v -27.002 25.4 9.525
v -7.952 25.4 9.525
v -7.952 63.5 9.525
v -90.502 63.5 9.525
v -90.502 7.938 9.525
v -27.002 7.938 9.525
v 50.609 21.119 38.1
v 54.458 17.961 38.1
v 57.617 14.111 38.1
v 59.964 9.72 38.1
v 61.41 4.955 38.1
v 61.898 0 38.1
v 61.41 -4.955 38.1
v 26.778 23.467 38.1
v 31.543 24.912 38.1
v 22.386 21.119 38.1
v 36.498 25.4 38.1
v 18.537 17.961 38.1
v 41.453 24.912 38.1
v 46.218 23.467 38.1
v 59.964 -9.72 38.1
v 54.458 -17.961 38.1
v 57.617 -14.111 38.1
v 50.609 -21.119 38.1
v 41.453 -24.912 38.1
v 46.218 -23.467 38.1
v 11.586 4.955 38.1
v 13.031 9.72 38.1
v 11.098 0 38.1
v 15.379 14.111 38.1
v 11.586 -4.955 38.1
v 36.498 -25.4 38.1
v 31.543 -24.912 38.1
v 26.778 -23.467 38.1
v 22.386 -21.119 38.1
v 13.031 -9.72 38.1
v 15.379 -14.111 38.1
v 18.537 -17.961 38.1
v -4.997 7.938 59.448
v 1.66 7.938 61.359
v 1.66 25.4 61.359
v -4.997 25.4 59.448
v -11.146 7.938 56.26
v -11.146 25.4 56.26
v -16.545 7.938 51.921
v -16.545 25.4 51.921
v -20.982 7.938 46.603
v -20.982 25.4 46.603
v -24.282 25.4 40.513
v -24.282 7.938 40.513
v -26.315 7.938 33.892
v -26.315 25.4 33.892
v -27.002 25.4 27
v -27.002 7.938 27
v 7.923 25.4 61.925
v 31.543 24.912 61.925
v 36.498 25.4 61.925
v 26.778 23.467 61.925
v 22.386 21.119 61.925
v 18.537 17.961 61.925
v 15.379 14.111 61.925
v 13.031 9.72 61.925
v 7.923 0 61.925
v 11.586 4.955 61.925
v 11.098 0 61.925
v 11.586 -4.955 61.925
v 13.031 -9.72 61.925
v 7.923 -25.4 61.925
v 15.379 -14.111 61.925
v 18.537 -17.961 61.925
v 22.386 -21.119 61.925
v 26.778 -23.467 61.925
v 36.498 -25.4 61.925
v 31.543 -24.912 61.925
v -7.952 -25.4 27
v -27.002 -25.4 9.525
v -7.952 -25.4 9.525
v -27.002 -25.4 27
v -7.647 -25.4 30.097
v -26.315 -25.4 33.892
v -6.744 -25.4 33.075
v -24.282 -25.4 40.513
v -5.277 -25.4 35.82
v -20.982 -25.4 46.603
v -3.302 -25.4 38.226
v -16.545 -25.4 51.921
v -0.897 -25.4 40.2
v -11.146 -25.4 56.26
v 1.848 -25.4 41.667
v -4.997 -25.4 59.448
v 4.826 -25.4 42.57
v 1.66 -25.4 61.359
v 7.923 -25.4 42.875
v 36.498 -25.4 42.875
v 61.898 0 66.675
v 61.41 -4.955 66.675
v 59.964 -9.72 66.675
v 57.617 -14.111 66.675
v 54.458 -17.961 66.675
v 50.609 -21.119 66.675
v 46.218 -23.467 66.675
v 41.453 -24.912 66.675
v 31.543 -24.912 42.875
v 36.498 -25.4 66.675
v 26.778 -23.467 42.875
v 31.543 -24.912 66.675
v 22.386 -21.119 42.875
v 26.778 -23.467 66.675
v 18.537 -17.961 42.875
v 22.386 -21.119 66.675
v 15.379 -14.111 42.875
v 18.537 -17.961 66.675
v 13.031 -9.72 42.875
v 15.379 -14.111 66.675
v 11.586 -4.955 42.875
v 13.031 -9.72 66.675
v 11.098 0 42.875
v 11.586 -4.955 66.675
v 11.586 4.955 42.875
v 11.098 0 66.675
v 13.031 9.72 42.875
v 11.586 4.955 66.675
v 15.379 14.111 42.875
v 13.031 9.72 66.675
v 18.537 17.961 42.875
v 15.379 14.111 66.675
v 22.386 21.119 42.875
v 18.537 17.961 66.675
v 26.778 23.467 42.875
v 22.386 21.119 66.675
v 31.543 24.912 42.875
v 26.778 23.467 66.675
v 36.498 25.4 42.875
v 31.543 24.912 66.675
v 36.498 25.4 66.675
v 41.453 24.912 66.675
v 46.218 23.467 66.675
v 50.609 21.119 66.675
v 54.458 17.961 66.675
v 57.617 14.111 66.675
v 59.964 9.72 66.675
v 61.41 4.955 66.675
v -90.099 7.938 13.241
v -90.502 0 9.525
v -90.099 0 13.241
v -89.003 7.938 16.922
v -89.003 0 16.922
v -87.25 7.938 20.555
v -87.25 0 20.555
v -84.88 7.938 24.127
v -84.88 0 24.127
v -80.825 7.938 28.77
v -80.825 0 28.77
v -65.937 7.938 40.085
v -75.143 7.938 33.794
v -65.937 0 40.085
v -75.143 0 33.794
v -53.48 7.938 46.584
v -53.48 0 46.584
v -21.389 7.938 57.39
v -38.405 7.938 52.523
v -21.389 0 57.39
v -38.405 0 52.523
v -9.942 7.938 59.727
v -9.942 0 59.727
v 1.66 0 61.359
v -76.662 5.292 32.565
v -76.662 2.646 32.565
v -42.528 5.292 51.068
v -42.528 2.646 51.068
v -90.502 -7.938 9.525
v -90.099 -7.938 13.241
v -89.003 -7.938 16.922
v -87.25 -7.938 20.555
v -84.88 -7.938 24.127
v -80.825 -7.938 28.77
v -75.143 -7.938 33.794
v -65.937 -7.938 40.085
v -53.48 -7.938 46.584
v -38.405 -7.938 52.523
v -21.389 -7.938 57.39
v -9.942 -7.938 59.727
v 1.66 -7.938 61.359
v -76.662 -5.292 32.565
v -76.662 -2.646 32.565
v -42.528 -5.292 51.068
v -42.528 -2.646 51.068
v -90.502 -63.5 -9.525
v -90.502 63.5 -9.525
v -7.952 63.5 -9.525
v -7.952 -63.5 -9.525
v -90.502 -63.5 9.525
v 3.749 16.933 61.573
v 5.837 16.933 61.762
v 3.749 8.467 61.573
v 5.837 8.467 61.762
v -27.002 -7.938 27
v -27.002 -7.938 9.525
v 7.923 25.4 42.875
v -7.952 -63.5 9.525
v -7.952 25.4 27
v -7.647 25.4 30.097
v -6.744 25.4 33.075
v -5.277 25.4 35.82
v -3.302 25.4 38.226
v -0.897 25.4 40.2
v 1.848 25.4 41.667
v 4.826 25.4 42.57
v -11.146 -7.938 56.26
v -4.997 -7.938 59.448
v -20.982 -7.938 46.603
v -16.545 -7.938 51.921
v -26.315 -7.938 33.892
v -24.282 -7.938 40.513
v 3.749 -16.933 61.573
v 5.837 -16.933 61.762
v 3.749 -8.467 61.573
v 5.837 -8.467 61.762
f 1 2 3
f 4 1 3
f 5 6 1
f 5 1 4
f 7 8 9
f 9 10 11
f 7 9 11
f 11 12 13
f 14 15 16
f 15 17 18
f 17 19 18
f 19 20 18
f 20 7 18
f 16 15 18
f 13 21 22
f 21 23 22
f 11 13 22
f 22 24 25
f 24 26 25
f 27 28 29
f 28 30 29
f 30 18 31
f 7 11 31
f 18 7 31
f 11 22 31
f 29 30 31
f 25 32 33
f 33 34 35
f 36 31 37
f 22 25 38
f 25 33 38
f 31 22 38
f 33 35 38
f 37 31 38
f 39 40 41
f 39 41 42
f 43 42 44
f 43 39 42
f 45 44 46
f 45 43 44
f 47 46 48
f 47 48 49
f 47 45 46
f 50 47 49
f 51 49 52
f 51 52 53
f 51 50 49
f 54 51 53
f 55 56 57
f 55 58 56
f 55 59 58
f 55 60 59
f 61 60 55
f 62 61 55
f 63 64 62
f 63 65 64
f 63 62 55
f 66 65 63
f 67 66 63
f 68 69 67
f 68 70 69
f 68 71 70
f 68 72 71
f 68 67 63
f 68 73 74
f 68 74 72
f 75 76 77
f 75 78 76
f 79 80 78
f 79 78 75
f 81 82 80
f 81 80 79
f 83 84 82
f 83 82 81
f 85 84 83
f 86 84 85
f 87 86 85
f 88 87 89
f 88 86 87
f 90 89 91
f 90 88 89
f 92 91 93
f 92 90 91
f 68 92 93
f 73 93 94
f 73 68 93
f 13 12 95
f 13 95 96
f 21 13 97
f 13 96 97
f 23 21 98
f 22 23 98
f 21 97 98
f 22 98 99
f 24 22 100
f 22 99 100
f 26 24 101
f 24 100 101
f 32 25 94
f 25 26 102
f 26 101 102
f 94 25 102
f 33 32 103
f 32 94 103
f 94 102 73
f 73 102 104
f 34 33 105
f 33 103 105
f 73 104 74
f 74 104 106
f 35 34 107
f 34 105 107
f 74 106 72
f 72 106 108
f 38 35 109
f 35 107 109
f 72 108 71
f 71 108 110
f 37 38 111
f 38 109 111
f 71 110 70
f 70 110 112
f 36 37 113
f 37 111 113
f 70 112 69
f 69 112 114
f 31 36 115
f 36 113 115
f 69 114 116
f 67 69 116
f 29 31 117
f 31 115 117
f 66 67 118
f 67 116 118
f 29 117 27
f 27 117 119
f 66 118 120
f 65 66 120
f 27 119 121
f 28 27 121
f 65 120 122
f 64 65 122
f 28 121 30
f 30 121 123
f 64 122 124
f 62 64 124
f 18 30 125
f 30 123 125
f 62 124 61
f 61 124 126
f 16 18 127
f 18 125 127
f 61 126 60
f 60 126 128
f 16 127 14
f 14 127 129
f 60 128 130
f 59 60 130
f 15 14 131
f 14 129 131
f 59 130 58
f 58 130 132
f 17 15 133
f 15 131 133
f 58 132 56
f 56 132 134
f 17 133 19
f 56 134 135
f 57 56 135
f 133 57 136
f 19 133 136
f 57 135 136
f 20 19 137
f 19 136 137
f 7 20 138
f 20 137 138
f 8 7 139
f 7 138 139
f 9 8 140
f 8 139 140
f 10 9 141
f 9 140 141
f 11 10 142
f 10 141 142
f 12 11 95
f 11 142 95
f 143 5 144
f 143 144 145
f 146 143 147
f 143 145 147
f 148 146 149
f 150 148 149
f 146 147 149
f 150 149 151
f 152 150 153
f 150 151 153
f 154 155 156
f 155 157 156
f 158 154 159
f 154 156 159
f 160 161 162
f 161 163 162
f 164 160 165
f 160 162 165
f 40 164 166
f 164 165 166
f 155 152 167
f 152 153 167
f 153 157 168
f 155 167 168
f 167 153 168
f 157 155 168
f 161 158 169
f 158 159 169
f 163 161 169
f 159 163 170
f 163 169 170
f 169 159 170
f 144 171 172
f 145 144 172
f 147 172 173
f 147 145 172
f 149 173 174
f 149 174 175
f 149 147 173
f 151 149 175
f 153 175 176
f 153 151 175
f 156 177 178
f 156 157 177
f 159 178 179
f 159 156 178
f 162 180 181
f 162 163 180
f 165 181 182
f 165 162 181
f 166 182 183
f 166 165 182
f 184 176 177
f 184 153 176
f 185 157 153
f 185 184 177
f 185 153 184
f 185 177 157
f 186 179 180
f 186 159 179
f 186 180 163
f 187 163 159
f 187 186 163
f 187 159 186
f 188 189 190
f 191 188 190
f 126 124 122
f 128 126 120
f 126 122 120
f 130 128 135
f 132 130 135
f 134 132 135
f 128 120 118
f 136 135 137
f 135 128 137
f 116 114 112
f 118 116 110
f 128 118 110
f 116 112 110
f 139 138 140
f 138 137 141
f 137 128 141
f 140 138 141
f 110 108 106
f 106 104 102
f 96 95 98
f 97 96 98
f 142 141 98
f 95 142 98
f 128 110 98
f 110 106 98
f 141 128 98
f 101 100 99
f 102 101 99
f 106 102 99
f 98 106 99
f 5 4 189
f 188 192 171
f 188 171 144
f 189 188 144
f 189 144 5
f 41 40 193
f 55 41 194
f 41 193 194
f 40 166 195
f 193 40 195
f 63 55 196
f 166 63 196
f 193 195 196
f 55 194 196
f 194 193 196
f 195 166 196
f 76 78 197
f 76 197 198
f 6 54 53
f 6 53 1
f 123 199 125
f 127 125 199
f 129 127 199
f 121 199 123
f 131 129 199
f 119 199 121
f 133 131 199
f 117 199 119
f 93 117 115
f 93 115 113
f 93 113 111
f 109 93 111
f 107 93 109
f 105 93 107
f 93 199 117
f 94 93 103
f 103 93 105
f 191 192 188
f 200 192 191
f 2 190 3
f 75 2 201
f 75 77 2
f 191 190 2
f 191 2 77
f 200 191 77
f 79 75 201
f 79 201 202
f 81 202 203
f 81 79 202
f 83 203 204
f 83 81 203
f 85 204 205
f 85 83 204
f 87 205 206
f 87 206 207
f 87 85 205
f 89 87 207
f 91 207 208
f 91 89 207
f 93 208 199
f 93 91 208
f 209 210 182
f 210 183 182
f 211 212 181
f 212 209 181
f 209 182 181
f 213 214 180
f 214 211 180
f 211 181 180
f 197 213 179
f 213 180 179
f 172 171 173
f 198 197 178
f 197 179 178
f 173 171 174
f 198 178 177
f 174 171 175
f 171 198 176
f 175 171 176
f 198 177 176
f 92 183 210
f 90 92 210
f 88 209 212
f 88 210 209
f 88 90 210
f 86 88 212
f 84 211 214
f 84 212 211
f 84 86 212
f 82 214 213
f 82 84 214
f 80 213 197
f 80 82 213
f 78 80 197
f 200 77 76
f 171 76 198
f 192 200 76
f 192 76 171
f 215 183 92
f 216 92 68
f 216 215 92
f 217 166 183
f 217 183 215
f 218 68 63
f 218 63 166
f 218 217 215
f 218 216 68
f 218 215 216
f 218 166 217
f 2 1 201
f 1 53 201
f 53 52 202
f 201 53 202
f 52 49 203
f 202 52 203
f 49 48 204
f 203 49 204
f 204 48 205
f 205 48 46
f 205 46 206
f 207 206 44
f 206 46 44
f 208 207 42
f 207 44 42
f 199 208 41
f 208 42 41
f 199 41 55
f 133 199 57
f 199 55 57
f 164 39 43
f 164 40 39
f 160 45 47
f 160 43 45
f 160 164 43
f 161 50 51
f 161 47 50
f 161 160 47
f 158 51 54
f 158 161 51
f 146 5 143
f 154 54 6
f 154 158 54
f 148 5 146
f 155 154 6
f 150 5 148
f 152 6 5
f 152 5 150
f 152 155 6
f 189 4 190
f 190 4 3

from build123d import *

# Parameters (mm, degrees)
F1_DEPTH = 63.5
F0_W     = 25.4
F0_H     = 19.05
F2_DEPTH = 25.4
F3_DEPTH = 7.9375


with BuildPart() as f1:
    # F0 (on Front) → F1 (new body, symmetric)
    with BuildSketch(Plane.XZ):
        Polygon((-90.502063, -9.525), (-7.952063, -9.525), (-7.952063, 9.525), (-27.002063, 9.525), (-90.502063, 9.525), align=None)
    extrude(amount=F1_DEPTH, both=True)

    # F0 (on Front) → F2 (join, symmetric)
    with BuildSketch(Plane.XZ):
        with BuildLine():
            Line((-27.002063, 9.525), (-7.952063, 9.525))
            Line((-7.952063, 9.525), (-7.952063, 27.0002))
            ThreePointArc((-7.952063, 27.0002), (-3.302383, 38.22552), (7.922937, 42.8752))
            Line((7.922937, 42.8752), (11.097937, 42.8752))
            Line((11.097937, 42.8752), (11.097937, 61.9252))
            Line((11.097937, 61.9252), (7.922937, 61.9252))
            add(Edge.make_bspline(
                [(1.660156, 61.359088), (3.749781, 61.58542), (5.838833, 61.774647), (7.922937, 61.9252)],
                knots=[106.639459, 106.639459, 106.639459, 106.639459, 111.504536, 111.504536, 111.504536, 111.504536], degree=3))
            ThreePointArc((1.660156, 61.359088), (-18.895743, 49.37237), (-27.002063, 27.0002))
            Line((-27.002063, 27.0002), (-27.002063, 9.525))
        make_face()
        with Locations((23.797937, 52.4002)):
            Rectangle(F0_W, F0_H)
    extrude(amount=F2_DEPTH, both=True)

    # F0 (on Front) → F3 (join, symmetric)
    with BuildSketch(Plane.XZ):
        with BuildLine():
            add(Edge.make_bspline(
                [(-90.502063, 9.525), (-90.221715, 33.60987), (-44.143125, 56.398042), (1.660156, 61.359088)],
                knots=[0, 0, 0, 0, 106.639459, 106.639459, 106.639459, 106.639459], degree=3))
            Line((-90.502063, 9.525), (-27.002063, 9.525))
            Line((-27.002063, 9.525), (-27.002063, 27.0002))
            ThreePointArc((-27.002063, 27.0002), (-18.895743, 49.37237), (1.660156, 61.359088))
        make_face()
    extrude(amount=F3_DEPTH, both=True)

    # F0 (on Front) → F4 (revolve)
    with BuildSketch(Plane.XZ):
        Polygon((36.497937, 61.9252), (36.497937, 42.8752), (36.497937, 38.1), (61.897937, 38.1), (61.897937, 66.675), (36.497937, 66.675), align=None)
    revolve(axis=Axis((36.497937, 0, 52.3875), (0, 0, -1)))


solid = f1.part
